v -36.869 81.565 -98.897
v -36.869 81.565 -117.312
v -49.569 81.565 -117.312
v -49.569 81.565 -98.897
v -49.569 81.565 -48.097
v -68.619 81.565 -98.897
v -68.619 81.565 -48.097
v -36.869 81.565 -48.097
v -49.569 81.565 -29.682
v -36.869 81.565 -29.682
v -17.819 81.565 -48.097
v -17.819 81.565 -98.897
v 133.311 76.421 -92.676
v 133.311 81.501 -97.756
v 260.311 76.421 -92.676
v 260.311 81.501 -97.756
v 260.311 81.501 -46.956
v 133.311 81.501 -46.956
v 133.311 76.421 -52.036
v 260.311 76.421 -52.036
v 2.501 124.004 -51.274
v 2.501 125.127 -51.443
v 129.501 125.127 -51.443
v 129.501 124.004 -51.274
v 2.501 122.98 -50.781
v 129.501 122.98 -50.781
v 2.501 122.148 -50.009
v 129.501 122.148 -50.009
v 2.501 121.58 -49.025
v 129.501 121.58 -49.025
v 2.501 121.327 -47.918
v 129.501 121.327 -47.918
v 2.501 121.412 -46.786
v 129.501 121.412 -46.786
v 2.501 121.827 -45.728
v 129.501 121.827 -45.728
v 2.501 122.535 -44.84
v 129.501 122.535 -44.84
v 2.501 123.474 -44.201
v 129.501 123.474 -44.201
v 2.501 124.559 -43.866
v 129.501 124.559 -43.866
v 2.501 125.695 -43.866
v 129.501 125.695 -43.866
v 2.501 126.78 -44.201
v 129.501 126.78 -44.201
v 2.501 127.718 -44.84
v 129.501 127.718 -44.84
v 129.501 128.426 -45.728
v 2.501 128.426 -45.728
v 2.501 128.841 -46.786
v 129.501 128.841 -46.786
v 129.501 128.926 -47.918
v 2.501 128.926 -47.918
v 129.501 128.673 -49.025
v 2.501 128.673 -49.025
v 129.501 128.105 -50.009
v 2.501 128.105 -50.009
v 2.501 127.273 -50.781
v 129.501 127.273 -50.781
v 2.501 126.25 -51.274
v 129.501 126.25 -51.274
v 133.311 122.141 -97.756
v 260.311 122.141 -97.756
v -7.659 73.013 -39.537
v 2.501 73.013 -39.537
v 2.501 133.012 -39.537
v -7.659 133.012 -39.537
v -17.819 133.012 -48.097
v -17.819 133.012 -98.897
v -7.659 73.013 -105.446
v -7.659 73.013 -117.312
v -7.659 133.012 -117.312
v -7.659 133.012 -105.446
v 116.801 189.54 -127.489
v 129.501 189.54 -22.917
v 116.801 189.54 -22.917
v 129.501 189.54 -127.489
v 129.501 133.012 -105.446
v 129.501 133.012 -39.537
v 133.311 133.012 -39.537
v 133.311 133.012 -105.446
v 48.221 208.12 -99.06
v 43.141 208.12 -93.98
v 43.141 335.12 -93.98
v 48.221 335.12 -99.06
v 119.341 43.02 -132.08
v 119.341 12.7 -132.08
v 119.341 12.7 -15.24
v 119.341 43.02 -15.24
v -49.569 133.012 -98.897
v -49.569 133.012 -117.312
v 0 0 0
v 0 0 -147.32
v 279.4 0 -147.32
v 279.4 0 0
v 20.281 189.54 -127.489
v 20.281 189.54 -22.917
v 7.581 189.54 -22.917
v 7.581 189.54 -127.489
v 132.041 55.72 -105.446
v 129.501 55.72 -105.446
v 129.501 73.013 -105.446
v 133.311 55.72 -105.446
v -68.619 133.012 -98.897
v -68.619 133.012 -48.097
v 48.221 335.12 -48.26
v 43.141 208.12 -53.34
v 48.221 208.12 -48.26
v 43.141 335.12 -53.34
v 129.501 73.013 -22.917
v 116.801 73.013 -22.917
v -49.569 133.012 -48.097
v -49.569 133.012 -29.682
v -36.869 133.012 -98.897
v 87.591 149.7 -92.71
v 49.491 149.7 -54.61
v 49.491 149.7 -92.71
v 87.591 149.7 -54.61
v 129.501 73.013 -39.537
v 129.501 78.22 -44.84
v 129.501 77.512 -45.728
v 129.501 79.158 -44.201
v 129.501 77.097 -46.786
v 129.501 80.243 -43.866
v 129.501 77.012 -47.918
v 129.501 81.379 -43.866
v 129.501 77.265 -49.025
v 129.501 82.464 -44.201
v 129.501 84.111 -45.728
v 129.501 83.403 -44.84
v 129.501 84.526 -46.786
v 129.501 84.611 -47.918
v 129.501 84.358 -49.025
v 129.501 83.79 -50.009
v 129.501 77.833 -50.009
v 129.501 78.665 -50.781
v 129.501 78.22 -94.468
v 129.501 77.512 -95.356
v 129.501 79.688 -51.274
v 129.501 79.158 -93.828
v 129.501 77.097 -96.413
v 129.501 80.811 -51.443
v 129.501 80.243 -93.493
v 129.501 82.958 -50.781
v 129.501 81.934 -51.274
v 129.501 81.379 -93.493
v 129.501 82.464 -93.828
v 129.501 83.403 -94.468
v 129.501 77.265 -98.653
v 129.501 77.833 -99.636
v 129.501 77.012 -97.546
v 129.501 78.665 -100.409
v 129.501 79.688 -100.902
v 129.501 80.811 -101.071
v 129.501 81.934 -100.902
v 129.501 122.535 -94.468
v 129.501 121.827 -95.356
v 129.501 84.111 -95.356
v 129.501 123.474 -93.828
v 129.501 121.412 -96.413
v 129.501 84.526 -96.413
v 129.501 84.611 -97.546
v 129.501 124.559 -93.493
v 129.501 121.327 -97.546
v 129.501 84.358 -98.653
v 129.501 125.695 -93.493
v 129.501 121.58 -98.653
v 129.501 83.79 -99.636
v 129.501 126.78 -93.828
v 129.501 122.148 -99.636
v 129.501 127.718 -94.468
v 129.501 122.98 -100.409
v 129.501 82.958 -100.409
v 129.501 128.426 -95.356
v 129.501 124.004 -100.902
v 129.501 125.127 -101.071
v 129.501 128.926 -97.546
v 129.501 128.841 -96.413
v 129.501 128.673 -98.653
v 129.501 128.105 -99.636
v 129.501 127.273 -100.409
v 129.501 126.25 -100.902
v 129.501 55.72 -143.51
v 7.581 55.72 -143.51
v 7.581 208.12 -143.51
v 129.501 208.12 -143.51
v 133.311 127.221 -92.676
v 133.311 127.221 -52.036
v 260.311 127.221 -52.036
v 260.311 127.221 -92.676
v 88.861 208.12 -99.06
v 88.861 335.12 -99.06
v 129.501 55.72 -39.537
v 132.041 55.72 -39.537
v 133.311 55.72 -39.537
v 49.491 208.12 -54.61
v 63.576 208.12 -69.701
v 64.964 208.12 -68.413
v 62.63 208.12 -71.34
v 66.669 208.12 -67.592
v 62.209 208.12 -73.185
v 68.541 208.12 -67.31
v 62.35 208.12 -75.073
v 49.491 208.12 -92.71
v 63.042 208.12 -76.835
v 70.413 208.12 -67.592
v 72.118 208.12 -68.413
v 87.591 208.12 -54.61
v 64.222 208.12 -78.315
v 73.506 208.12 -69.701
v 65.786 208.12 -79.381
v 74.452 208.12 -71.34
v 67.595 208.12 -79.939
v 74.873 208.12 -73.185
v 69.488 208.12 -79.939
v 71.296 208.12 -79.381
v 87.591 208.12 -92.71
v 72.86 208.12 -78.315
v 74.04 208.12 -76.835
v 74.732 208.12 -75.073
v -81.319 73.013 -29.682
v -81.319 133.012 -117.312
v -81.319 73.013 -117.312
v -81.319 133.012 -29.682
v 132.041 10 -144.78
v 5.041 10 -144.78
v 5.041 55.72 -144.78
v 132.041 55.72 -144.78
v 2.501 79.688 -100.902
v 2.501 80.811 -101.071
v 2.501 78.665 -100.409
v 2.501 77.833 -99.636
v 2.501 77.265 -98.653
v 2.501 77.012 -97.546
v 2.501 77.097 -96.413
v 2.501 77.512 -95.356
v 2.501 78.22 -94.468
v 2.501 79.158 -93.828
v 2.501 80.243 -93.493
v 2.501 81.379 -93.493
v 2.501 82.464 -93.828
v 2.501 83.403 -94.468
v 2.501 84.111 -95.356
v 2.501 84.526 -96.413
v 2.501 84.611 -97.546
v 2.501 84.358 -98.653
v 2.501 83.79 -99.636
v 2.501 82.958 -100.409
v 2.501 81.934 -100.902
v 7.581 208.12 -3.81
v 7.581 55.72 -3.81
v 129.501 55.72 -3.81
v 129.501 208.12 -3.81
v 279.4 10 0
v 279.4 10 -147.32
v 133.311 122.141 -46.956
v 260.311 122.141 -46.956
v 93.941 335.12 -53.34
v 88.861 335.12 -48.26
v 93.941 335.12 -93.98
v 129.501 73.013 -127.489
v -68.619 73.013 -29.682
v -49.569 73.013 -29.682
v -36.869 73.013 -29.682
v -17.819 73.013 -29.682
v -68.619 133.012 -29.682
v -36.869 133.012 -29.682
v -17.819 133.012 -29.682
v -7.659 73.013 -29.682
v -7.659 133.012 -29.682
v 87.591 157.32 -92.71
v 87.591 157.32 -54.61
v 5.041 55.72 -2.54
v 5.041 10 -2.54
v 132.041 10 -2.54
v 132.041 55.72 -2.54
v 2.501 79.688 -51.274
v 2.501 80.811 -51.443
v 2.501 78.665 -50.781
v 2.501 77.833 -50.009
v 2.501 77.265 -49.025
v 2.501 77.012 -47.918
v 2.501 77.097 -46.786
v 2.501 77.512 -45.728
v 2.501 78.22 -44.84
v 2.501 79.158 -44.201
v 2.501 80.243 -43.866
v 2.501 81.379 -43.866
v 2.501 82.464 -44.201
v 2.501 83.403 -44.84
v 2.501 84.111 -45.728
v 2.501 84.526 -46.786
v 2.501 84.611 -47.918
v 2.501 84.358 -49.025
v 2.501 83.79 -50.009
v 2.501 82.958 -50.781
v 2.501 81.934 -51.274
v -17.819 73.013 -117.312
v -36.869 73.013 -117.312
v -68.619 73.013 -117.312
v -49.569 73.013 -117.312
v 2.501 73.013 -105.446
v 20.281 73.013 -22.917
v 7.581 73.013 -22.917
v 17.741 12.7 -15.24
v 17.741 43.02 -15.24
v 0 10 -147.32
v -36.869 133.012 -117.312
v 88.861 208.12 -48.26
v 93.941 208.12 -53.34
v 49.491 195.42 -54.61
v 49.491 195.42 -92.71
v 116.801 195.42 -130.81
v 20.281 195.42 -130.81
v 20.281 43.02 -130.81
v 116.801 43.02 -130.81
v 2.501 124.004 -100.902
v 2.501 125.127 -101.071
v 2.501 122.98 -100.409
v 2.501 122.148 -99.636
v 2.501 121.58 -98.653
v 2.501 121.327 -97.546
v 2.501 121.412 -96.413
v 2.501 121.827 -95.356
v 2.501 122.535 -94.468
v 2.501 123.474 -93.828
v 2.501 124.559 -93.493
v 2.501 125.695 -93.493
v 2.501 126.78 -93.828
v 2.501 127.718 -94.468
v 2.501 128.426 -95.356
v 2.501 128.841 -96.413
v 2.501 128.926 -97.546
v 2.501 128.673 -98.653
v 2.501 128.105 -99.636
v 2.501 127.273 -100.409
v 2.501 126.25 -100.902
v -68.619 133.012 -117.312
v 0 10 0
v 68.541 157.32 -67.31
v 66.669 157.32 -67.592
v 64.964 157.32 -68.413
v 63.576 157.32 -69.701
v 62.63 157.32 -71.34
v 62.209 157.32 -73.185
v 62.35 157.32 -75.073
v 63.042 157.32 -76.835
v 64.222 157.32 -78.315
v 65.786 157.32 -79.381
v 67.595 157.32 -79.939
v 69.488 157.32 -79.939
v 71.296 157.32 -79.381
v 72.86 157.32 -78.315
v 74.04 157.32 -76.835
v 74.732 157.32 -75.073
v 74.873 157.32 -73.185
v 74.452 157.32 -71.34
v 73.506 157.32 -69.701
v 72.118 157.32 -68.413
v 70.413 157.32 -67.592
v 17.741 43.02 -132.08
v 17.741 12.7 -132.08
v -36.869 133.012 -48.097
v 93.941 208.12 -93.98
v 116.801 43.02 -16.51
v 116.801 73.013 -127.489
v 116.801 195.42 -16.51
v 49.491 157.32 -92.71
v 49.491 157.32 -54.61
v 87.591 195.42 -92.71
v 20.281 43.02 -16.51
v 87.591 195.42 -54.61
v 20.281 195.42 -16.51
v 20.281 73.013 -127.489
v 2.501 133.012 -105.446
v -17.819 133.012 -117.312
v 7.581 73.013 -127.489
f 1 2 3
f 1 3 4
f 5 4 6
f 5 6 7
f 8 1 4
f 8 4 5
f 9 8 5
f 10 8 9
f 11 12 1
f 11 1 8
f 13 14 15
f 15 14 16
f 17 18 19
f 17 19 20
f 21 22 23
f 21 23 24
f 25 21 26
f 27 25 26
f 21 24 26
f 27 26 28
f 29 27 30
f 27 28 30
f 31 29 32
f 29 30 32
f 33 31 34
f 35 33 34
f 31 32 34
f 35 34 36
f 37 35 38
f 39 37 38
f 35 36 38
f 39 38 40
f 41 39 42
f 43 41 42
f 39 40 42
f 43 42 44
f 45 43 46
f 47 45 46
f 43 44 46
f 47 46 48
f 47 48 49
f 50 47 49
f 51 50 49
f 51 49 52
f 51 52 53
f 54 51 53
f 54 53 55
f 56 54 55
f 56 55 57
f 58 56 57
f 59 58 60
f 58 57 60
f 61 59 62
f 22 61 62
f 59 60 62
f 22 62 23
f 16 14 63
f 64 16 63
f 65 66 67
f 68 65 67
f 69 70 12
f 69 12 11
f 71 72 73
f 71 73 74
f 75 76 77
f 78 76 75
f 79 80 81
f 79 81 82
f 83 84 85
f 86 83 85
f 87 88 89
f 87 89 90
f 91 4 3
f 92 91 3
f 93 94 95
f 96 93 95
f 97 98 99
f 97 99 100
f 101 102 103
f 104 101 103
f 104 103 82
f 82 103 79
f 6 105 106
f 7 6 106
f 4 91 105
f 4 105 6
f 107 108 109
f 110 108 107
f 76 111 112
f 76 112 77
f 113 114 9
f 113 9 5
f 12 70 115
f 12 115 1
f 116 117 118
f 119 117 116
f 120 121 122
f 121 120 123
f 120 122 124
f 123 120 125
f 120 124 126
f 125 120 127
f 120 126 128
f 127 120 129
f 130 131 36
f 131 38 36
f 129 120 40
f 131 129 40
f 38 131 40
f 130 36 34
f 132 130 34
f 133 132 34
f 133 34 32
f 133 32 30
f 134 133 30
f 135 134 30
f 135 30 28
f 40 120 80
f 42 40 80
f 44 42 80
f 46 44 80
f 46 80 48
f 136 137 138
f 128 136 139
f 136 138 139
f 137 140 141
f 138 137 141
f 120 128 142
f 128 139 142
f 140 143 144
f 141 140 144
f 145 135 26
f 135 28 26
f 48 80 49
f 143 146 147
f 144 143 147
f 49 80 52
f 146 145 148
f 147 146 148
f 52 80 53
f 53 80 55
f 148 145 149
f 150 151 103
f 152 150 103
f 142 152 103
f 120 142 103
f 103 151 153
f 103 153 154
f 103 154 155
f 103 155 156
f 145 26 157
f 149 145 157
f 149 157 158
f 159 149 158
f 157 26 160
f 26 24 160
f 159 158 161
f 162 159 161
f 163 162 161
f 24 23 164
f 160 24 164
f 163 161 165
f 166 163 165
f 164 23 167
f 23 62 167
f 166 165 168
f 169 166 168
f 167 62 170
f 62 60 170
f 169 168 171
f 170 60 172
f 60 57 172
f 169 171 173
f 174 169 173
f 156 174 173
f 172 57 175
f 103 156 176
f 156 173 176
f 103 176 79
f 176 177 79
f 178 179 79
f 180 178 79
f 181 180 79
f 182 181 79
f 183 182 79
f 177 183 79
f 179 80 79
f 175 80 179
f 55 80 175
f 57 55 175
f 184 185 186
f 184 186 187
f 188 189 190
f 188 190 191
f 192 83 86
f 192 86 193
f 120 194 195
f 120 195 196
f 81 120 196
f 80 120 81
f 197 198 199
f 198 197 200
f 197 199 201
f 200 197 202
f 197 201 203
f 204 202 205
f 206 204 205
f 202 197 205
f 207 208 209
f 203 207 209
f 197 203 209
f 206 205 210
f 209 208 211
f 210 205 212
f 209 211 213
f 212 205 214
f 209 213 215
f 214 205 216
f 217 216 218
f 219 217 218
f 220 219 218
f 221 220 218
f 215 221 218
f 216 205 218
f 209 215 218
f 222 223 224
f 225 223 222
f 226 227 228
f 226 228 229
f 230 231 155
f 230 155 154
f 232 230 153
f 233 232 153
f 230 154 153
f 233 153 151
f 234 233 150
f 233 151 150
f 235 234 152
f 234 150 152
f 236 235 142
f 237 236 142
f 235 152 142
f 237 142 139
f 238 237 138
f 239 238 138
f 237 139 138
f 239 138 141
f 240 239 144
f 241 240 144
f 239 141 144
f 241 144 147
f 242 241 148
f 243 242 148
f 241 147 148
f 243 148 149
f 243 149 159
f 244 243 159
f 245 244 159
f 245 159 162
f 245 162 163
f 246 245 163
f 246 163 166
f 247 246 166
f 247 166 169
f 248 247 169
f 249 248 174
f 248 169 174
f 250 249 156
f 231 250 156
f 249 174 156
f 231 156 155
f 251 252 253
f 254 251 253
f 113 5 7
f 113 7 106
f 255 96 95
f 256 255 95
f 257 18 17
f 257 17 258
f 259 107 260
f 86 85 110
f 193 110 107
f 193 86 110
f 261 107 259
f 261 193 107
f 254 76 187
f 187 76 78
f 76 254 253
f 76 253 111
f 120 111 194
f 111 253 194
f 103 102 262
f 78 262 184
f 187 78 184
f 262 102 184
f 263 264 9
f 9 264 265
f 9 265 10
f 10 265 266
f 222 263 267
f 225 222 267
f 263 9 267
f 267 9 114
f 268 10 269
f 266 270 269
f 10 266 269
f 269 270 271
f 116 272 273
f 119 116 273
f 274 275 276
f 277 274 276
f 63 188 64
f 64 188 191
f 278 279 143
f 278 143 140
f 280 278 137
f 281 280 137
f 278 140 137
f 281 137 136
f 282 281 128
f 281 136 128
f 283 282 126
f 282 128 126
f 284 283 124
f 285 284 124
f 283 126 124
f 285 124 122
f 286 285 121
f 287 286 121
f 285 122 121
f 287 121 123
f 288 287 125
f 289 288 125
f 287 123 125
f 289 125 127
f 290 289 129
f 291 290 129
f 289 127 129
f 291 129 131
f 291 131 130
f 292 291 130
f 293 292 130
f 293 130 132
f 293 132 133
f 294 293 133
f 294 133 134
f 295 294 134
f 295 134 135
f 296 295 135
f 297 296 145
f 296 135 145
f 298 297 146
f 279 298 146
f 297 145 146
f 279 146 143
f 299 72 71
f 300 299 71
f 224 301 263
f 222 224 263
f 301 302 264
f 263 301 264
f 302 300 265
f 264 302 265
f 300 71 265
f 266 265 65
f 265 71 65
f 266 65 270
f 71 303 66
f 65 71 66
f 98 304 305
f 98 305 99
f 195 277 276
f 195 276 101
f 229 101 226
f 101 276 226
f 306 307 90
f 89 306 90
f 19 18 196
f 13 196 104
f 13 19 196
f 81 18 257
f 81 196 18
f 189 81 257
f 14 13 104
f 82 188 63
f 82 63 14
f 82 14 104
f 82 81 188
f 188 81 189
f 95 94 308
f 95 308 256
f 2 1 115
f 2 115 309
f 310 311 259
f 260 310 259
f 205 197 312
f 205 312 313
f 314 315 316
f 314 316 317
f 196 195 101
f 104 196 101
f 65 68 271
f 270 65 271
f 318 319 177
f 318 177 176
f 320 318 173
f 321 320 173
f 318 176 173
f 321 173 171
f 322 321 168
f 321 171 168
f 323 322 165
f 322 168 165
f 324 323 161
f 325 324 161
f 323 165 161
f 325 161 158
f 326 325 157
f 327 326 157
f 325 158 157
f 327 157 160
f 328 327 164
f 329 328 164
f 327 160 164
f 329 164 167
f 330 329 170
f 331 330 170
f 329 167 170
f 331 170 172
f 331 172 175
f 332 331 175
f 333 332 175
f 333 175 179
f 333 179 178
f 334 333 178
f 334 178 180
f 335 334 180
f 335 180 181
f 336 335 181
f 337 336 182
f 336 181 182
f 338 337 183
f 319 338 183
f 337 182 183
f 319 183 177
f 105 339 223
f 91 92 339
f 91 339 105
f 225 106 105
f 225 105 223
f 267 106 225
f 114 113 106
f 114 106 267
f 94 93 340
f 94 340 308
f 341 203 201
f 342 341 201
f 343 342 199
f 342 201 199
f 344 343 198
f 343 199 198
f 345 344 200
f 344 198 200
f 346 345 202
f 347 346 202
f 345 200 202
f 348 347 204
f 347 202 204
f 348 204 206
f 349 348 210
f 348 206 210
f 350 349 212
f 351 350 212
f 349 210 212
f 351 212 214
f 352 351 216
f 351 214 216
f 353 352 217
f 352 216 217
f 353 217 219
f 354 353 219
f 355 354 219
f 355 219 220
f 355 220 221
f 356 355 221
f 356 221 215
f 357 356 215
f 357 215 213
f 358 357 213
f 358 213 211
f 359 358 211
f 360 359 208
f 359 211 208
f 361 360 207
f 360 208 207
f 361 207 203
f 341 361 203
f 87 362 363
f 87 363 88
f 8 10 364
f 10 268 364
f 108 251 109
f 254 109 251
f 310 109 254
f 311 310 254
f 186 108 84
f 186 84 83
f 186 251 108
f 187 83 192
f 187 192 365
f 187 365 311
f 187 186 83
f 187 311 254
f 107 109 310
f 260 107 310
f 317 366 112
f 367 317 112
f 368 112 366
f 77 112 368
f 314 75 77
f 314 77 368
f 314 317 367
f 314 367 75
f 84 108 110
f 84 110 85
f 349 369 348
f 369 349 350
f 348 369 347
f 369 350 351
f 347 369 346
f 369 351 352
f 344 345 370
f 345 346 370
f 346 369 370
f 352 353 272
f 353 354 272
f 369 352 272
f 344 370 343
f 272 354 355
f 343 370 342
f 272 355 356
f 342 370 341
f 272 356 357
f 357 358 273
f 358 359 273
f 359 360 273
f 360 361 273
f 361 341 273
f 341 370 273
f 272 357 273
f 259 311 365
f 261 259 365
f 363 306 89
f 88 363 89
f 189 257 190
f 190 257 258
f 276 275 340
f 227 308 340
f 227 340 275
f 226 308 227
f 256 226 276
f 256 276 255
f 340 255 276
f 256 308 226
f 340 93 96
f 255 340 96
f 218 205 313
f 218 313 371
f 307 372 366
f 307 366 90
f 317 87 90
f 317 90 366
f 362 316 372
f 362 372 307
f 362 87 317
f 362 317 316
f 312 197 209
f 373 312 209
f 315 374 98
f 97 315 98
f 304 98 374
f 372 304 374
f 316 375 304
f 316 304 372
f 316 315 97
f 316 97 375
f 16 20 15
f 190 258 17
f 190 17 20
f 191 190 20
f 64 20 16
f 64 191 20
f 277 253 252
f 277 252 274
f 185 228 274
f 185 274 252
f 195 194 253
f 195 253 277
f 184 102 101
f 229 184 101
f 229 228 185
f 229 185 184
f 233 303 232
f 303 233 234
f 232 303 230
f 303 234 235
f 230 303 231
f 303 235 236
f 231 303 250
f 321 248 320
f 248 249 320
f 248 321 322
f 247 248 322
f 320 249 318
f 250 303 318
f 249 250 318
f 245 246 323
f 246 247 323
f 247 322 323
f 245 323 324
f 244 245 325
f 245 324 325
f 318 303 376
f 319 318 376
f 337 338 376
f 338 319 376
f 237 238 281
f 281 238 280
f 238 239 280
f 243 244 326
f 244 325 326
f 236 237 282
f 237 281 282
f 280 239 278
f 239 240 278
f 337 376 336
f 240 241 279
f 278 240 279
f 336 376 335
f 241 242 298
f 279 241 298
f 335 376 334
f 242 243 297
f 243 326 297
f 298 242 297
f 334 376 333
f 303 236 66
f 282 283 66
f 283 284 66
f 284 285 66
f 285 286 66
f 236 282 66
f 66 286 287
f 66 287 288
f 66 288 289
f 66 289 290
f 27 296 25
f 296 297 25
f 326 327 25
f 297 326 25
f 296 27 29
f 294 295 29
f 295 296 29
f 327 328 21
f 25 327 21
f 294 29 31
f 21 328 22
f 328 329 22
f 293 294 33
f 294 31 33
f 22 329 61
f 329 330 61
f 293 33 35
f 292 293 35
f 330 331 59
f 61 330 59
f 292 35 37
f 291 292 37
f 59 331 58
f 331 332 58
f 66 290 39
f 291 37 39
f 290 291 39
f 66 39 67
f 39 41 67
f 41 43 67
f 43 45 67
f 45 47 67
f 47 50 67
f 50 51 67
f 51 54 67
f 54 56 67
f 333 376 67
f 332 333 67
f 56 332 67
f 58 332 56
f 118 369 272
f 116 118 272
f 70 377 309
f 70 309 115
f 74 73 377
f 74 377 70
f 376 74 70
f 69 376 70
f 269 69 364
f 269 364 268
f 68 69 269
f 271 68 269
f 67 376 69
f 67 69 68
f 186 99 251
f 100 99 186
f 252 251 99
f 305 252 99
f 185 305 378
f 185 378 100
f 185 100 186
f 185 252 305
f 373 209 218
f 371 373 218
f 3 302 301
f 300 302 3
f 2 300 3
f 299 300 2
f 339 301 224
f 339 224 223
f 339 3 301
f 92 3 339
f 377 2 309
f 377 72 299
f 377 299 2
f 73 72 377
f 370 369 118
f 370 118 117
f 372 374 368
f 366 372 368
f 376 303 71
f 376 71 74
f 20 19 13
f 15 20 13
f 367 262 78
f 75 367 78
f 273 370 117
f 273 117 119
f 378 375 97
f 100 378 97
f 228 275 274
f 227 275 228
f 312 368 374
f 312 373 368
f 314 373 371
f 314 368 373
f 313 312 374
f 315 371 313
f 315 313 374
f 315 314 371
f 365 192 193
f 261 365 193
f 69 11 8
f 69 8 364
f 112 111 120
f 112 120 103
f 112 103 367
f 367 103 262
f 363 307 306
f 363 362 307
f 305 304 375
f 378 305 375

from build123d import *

# Parameters (mm, degrees)
SKETCH1_W            = 279.4
SKETCH1_H            = 147.32
BOSS_EXTRUDE1_DEPTH  = 10
SKETCH2_W            = 127
SKETCH2_H            = 142.24
BOSS_EXTRUDE2_DEPTH  = 45.72
SKETCH3_W            = 121.92
SKETCH3_H            = 139.7
BOSS_EXTRUDE3_DEPTH  = 152.4
SHELL1_START         = -130.81
SHELL1_DEPTH         = 114.3
SHELL1_START_2       = -132.08
SHELL1_2_OUTLINE_W   = 101.6
SHELL1_2_OUTLINE_H   = 30.32
SHELL1_2_DEPTH       = 116.84
SKETCH5_W            = 104.57255138
SKETCH5_H            = 116.526725643
CUT_EXTRUDE1_DEPTH   = 152.4
CUT_EXTRUDE2_REACH   = 380.261
SKETCH6_W            = 38.1
SKETCH6_H            = 38.1
SKETCH7_W            = 50.8
SKETCH7_H            = 50.8
BOSS_EXTRUDE4_DEPTH  = 127
SKETCH8_R            = 6.35
BOSS_EXTRUDE5_DEPTH  = 50.8
SKETCH9_W            = 38.1
SKETCH9_H            = 38.1
BOSS_EXTRUDE6_DEPTH  = 7.62
CHAMFER1_SIZE        = 5.08
SKETCH11_W           = 65.909153677
SKETCH11_H           = 77.291627037
BOSS_EXTRUDE8_DEPTH  = 3.81
SKETCH12_W           = 50.8
SKETCH12_H           = 50.8
BOSS_EXTRUDE9_DEPTH  = 127
CHAMFER2_SIZE        = 5.08
SKETCH13_R           = 3.81
BOSS_EXTRUDE10_DEPTH = 127
SKETCH14_W           = 65.909153677
SKETCH14_H           = 59.998529599
BOSS_EXTRUDE11_DEPTH = 10.16
SKETCH15_W           = 87.63
SKETCH15_H           = 59.998529599
BOSS_EXTRUDE12_DEPTH = 10.16
BOSS_EXTRUDE13_DEPTH = 19.05
SKETCH17_W           = 87.63
SKETCH17_H           = 8.552313921
BOSS_EXTRUDE14_DEPTH = 12.7
BOSS_EXTRUDE15_DEPTH = 19.05
SKETCH19_W           = 87.63
SKETCH19_H           = 59.998529599
BOSS_EXTRUDE16_DEPTH = 12.7


# Read off the part's stored shape, not the designer's step: Shell1
with BuildPart() as part:
    # Sketch1 → Boss-Extrude1 (new body)
    with BuildSketch(Plane(origin=(0, 0, 0), x_dir=(1, 0, 0), z_dir=(0, 1, 0))):
        with Locations((139.7, 73.66)):
            Rectangle(SKETCH1_W, SKETCH1_H)
    extrude(amount=BOSS_EXTRUDE1_DEPTH)

    # Sketch2 → Boss-Extrude2 (add)
    with BuildSketch(Plane(origin=(0, 10, 0), x_dir=(1, 0, 0), z_dir=(0, 1, 0))):
        with Locations((68.541128652, 73.66)):
            Rectangle(SKETCH2_W, SKETCH2_H)
    extrude(amount=BOSS_EXTRUDE2_DEPTH)

    # Sketch3 → Boss-Extrude3 (add)
    with BuildSketch(Plane(origin=(0, 55.72, 0), x_dir=(1, 0, 0), z_dir=(0, 1, 0))):
        with Locations((68.541128652, 73.66)):
            Rectangle(SKETCH3_W, SKETCH3_H)
    extrude(amount=BOSS_EXTRUDE3_DEPTH)

    # Shell1 outline → Shell1 (cut)
    with BuildSketch(Plane.XY.offset(SHELL1_START)):
        Polygon((17.741128652, 12.7), (119.341128652, 12.7), (119.341128652, 43.02), (116.801128652, 43.02), (116.801128652, 195.42), (20.281128652, 195.42), (20.281128652, 43.02), (17.741128652, 43.02), align=None)
    extrude(amount=SHELL1_DEPTH, mode=Mode.SUBTRACT)

    # Shell1 2 outline → Shell1 2 (cut)
    with BuildSketch(Plane.XY.offset(SHELL1_START_2)):
        with Locations((68.541128652, 27.86)):
            Rectangle(SHELL1_2_OUTLINE_W, SHELL1_2_OUTLINE_H)
    extrude(amount=SHELL1_2_DEPTH, mode=Mode.SUBTRACT)

    # Sketch5 → Cut-Extrude1 (cut)
    with BuildSketch(Plane(origin=(129.501128652, 0, 0), x_dir=(0, 0, -1), z_dir=(1, 0, 0))):
        with Locations((75.203066098, 131.276460259)):
            Rectangle(SKETCH5_W, SKETCH5_H)
    extrude(amount=-CUT_EXTRUDE1_DEPTH, mode=Mode.SUBTRACT)

    # Sketch6 → Cut-Extrude2 (cut, up to next)
    with BuildSketch(Plane(origin=(0, 208.12, 0), x_dir=(1, 0, 0), z_dir=(0, 1, 0)), mode=Mode.PRIVATE) as cut_extrude2_sk1:
        with Locations((68.541128652, 73.66)):
            Rectangle(SKETCH6_W, SKETCH6_H)
    cut_extrude2_tool1 = extrude(cut_extrude2_sk1.sketch, amount=-CUT_EXTRUDE2_REACH, mode=Mode.PRIVATE) & part.part
    add(cut_extrude2_tool1.solids().sort_by_distance((68.541129, 208.12, -73.66))[0], mode=Mode.SUBTRACT)

    # Sketch7 → Boss-Extrude4 (add)
    with BuildSketch(Plane(origin=(0, 208.12, 0), x_dir=(1, 0, 0), z_dir=(0, 1, 0))):
        with Locations((68.541128652, 73.66)):
            Rectangle(SKETCH7_W, SKETCH7_H)
    extrude(amount=BOSS_EXTRUDE4_DEPTH)

    # Sketch8 → Boss-Extrude5 (add)
    with BuildSketch(Plane.XZ.offset(-208.12)):
        with Locations(Location((68.541128652, -73.66, 0), (0, 0, 90))):
            Circle(SKETCH8_R)
    extrude(amount=BOSS_EXTRUDE5_DEPTH)

    # Sketch9 → Boss-Extrude6 (add)
    with BuildSketch(Plane.XZ.offset(-157.32)):
        with Locations((68.541128652, -73.66)):
            Rectangle(SKETCH9_W, SKETCH9_H)
    extrude(amount=BOSS_EXTRUDE6_DEPTH)

    # Chamfer1
    chamfer1_edges = [part.edges().sort_by_distance(p)[0] for p in [
        (43.141128652, 271.62, -99.06),
        (43.141128652, 271.62, -48.26),
        (93.941128652, 271.62, -48.26),
        (93.941128652, 271.62, -99.06),
    ]]
    chamfer(chamfer1_edges, length=CHAMFER1_SIZE)

    # Sketch11 → Boss-Extrude8 (add)
    with BuildSketch(Plane(origin=(129.501128652, 0, 0), x_dir=(0, 0, -1), z_dir=(1, 0, 0))):
        with Locations((72.491397984, 94.365813519)):
            Rectangle(SKETCH11_W, SKETCH11_H)
    extrude(amount=BOSS_EXTRUDE8_DEPTH)

    # Sketch12 → Boss-Extrude9 (add)
    with BuildSketch(Plane(origin=(133.311128652, 0, 0), x_dir=(0, 0, -1), z_dir=(1, 0, 0))):
        with Locations((72.356136011, 101.821276894)):
            Rectangle(SKETCH12_W, SKETCH12_H)
    extrude(amount=BOSS_EXTRUDE9_DEPTH)

    # Chamfer2
    chamfer2_edges = [part.edges().sort_by_distance(p)[0] for p in [
        (196.811128652, 127.221276894, -46.956136011),
        (196.811128652, 76.421276894, -46.956136011),
        (196.811128652, 76.421276894, -97.756136011),
        (196.811128652, 127.221276894, -97.756136011),
    ]]
    chamfer(chamfer2_edges, length=CHAMFER2_SIZE)

    # Sketch13 → Boss-Extrude10 (add)
    with BuildSketch(Plane.ZY.offset(-129.501128652)):
        with Locations(Location((-97.260941216, 125.126689221, 0), (0, 0, 180))):
            Circle(SKETCH13_R)
        with Locations(Location((-47.633379276, 125.126689221, 0), (0, 0, 180))):
            Circle(SKETCH13_R)
        with Locations(Location((-97.260941216, 80.811309035, 0), (0, 0, 180))):
            Circle(SKETCH13_R)
        with Locations(Location((-47.633379276, 80.811309035, 0), (0, 0, 180))):
            Circle(SKETCH13_R)
    extrude(amount=BOSS_EXTRUDE10_DEPTH)

    # Sketch14 → Boss-Extrude11 (add)
    with BuildSketch(Plane.ZY.offset(-2.501128652)):
        with Locations((-72.491397984, 103.012362238)):
            Rectangle(SKETCH14_W, SKETCH14_H)
    extrude(amount=BOSS_EXTRUDE11_DEPTH)

    # Sketch15 → Boss-Extrude12 (add)
    with BuildSketch(Plane.ZY.offset(7.658871348)):
        with Locations((-73.497023893, 103.012362238)):
            Rectangle(SKETCH15_W, SKETCH15_H)
    extrude(amount=BOSS_EXTRUDE12_DEPTH)

    # Sketch16 → Boss-Extrude13 (add)
    with BuildSketch(Plane.ZY.offset(17.818871348)):
        Polygon((-117.312023893, 133.011627037), (-98.897023893, 133.011627037), (-98.897023893, 81.565411359), (-48.097023893, 81.565411359), (-48.097023893, 133.011627037), (-29.682023893, 133.011627037), (-29.682023893, 73.013097438), (-117.312023893, 73.013097438), align=None)
    extrude(amount=BOSS_EXTRUDE13_DEPTH)

    # Sketch17 → Boss-Extrude14 (add)
    with BuildSketch(Plane.ZY.offset(36.868871348)):
        with Locations((-73.497023893, 77.289254399)):
            Rectangle(SKETCH17_W, SKETCH17_H)
    extrude(amount=BOSS_EXTRUDE14_DEPTH)

    # Sketch18 → Boss-Extrude15 (add)
    with BuildSketch(Plane.ZY.offset(49.568871348)):
        Polygon((-117.312023893, 73.013097438), (-117.312023893, 133.011627037), (-98.897023893, 133.011627037), (-98.897023893, 81.565411359), (-48.097023893, 81.565411359), (-48.097023893, 133.011627037), (-29.682023893, 133.011627037), (-29.682023893, 73.013097438), align=None)
    extrude(amount=BOSS_EXTRUDE15_DEPTH)

    # Sketch19 → Boss-Extrude16 (add)
    with BuildSketch(Plane.ZY.offset(68.618871348)):
        with Locations((-73.497023893, 103.012362238)):
            Rectangle(SKETCH19_W, SKETCH19_H)
    extrude(amount=BOSS_EXTRUDE16_DEPTH)


solid = part.part
